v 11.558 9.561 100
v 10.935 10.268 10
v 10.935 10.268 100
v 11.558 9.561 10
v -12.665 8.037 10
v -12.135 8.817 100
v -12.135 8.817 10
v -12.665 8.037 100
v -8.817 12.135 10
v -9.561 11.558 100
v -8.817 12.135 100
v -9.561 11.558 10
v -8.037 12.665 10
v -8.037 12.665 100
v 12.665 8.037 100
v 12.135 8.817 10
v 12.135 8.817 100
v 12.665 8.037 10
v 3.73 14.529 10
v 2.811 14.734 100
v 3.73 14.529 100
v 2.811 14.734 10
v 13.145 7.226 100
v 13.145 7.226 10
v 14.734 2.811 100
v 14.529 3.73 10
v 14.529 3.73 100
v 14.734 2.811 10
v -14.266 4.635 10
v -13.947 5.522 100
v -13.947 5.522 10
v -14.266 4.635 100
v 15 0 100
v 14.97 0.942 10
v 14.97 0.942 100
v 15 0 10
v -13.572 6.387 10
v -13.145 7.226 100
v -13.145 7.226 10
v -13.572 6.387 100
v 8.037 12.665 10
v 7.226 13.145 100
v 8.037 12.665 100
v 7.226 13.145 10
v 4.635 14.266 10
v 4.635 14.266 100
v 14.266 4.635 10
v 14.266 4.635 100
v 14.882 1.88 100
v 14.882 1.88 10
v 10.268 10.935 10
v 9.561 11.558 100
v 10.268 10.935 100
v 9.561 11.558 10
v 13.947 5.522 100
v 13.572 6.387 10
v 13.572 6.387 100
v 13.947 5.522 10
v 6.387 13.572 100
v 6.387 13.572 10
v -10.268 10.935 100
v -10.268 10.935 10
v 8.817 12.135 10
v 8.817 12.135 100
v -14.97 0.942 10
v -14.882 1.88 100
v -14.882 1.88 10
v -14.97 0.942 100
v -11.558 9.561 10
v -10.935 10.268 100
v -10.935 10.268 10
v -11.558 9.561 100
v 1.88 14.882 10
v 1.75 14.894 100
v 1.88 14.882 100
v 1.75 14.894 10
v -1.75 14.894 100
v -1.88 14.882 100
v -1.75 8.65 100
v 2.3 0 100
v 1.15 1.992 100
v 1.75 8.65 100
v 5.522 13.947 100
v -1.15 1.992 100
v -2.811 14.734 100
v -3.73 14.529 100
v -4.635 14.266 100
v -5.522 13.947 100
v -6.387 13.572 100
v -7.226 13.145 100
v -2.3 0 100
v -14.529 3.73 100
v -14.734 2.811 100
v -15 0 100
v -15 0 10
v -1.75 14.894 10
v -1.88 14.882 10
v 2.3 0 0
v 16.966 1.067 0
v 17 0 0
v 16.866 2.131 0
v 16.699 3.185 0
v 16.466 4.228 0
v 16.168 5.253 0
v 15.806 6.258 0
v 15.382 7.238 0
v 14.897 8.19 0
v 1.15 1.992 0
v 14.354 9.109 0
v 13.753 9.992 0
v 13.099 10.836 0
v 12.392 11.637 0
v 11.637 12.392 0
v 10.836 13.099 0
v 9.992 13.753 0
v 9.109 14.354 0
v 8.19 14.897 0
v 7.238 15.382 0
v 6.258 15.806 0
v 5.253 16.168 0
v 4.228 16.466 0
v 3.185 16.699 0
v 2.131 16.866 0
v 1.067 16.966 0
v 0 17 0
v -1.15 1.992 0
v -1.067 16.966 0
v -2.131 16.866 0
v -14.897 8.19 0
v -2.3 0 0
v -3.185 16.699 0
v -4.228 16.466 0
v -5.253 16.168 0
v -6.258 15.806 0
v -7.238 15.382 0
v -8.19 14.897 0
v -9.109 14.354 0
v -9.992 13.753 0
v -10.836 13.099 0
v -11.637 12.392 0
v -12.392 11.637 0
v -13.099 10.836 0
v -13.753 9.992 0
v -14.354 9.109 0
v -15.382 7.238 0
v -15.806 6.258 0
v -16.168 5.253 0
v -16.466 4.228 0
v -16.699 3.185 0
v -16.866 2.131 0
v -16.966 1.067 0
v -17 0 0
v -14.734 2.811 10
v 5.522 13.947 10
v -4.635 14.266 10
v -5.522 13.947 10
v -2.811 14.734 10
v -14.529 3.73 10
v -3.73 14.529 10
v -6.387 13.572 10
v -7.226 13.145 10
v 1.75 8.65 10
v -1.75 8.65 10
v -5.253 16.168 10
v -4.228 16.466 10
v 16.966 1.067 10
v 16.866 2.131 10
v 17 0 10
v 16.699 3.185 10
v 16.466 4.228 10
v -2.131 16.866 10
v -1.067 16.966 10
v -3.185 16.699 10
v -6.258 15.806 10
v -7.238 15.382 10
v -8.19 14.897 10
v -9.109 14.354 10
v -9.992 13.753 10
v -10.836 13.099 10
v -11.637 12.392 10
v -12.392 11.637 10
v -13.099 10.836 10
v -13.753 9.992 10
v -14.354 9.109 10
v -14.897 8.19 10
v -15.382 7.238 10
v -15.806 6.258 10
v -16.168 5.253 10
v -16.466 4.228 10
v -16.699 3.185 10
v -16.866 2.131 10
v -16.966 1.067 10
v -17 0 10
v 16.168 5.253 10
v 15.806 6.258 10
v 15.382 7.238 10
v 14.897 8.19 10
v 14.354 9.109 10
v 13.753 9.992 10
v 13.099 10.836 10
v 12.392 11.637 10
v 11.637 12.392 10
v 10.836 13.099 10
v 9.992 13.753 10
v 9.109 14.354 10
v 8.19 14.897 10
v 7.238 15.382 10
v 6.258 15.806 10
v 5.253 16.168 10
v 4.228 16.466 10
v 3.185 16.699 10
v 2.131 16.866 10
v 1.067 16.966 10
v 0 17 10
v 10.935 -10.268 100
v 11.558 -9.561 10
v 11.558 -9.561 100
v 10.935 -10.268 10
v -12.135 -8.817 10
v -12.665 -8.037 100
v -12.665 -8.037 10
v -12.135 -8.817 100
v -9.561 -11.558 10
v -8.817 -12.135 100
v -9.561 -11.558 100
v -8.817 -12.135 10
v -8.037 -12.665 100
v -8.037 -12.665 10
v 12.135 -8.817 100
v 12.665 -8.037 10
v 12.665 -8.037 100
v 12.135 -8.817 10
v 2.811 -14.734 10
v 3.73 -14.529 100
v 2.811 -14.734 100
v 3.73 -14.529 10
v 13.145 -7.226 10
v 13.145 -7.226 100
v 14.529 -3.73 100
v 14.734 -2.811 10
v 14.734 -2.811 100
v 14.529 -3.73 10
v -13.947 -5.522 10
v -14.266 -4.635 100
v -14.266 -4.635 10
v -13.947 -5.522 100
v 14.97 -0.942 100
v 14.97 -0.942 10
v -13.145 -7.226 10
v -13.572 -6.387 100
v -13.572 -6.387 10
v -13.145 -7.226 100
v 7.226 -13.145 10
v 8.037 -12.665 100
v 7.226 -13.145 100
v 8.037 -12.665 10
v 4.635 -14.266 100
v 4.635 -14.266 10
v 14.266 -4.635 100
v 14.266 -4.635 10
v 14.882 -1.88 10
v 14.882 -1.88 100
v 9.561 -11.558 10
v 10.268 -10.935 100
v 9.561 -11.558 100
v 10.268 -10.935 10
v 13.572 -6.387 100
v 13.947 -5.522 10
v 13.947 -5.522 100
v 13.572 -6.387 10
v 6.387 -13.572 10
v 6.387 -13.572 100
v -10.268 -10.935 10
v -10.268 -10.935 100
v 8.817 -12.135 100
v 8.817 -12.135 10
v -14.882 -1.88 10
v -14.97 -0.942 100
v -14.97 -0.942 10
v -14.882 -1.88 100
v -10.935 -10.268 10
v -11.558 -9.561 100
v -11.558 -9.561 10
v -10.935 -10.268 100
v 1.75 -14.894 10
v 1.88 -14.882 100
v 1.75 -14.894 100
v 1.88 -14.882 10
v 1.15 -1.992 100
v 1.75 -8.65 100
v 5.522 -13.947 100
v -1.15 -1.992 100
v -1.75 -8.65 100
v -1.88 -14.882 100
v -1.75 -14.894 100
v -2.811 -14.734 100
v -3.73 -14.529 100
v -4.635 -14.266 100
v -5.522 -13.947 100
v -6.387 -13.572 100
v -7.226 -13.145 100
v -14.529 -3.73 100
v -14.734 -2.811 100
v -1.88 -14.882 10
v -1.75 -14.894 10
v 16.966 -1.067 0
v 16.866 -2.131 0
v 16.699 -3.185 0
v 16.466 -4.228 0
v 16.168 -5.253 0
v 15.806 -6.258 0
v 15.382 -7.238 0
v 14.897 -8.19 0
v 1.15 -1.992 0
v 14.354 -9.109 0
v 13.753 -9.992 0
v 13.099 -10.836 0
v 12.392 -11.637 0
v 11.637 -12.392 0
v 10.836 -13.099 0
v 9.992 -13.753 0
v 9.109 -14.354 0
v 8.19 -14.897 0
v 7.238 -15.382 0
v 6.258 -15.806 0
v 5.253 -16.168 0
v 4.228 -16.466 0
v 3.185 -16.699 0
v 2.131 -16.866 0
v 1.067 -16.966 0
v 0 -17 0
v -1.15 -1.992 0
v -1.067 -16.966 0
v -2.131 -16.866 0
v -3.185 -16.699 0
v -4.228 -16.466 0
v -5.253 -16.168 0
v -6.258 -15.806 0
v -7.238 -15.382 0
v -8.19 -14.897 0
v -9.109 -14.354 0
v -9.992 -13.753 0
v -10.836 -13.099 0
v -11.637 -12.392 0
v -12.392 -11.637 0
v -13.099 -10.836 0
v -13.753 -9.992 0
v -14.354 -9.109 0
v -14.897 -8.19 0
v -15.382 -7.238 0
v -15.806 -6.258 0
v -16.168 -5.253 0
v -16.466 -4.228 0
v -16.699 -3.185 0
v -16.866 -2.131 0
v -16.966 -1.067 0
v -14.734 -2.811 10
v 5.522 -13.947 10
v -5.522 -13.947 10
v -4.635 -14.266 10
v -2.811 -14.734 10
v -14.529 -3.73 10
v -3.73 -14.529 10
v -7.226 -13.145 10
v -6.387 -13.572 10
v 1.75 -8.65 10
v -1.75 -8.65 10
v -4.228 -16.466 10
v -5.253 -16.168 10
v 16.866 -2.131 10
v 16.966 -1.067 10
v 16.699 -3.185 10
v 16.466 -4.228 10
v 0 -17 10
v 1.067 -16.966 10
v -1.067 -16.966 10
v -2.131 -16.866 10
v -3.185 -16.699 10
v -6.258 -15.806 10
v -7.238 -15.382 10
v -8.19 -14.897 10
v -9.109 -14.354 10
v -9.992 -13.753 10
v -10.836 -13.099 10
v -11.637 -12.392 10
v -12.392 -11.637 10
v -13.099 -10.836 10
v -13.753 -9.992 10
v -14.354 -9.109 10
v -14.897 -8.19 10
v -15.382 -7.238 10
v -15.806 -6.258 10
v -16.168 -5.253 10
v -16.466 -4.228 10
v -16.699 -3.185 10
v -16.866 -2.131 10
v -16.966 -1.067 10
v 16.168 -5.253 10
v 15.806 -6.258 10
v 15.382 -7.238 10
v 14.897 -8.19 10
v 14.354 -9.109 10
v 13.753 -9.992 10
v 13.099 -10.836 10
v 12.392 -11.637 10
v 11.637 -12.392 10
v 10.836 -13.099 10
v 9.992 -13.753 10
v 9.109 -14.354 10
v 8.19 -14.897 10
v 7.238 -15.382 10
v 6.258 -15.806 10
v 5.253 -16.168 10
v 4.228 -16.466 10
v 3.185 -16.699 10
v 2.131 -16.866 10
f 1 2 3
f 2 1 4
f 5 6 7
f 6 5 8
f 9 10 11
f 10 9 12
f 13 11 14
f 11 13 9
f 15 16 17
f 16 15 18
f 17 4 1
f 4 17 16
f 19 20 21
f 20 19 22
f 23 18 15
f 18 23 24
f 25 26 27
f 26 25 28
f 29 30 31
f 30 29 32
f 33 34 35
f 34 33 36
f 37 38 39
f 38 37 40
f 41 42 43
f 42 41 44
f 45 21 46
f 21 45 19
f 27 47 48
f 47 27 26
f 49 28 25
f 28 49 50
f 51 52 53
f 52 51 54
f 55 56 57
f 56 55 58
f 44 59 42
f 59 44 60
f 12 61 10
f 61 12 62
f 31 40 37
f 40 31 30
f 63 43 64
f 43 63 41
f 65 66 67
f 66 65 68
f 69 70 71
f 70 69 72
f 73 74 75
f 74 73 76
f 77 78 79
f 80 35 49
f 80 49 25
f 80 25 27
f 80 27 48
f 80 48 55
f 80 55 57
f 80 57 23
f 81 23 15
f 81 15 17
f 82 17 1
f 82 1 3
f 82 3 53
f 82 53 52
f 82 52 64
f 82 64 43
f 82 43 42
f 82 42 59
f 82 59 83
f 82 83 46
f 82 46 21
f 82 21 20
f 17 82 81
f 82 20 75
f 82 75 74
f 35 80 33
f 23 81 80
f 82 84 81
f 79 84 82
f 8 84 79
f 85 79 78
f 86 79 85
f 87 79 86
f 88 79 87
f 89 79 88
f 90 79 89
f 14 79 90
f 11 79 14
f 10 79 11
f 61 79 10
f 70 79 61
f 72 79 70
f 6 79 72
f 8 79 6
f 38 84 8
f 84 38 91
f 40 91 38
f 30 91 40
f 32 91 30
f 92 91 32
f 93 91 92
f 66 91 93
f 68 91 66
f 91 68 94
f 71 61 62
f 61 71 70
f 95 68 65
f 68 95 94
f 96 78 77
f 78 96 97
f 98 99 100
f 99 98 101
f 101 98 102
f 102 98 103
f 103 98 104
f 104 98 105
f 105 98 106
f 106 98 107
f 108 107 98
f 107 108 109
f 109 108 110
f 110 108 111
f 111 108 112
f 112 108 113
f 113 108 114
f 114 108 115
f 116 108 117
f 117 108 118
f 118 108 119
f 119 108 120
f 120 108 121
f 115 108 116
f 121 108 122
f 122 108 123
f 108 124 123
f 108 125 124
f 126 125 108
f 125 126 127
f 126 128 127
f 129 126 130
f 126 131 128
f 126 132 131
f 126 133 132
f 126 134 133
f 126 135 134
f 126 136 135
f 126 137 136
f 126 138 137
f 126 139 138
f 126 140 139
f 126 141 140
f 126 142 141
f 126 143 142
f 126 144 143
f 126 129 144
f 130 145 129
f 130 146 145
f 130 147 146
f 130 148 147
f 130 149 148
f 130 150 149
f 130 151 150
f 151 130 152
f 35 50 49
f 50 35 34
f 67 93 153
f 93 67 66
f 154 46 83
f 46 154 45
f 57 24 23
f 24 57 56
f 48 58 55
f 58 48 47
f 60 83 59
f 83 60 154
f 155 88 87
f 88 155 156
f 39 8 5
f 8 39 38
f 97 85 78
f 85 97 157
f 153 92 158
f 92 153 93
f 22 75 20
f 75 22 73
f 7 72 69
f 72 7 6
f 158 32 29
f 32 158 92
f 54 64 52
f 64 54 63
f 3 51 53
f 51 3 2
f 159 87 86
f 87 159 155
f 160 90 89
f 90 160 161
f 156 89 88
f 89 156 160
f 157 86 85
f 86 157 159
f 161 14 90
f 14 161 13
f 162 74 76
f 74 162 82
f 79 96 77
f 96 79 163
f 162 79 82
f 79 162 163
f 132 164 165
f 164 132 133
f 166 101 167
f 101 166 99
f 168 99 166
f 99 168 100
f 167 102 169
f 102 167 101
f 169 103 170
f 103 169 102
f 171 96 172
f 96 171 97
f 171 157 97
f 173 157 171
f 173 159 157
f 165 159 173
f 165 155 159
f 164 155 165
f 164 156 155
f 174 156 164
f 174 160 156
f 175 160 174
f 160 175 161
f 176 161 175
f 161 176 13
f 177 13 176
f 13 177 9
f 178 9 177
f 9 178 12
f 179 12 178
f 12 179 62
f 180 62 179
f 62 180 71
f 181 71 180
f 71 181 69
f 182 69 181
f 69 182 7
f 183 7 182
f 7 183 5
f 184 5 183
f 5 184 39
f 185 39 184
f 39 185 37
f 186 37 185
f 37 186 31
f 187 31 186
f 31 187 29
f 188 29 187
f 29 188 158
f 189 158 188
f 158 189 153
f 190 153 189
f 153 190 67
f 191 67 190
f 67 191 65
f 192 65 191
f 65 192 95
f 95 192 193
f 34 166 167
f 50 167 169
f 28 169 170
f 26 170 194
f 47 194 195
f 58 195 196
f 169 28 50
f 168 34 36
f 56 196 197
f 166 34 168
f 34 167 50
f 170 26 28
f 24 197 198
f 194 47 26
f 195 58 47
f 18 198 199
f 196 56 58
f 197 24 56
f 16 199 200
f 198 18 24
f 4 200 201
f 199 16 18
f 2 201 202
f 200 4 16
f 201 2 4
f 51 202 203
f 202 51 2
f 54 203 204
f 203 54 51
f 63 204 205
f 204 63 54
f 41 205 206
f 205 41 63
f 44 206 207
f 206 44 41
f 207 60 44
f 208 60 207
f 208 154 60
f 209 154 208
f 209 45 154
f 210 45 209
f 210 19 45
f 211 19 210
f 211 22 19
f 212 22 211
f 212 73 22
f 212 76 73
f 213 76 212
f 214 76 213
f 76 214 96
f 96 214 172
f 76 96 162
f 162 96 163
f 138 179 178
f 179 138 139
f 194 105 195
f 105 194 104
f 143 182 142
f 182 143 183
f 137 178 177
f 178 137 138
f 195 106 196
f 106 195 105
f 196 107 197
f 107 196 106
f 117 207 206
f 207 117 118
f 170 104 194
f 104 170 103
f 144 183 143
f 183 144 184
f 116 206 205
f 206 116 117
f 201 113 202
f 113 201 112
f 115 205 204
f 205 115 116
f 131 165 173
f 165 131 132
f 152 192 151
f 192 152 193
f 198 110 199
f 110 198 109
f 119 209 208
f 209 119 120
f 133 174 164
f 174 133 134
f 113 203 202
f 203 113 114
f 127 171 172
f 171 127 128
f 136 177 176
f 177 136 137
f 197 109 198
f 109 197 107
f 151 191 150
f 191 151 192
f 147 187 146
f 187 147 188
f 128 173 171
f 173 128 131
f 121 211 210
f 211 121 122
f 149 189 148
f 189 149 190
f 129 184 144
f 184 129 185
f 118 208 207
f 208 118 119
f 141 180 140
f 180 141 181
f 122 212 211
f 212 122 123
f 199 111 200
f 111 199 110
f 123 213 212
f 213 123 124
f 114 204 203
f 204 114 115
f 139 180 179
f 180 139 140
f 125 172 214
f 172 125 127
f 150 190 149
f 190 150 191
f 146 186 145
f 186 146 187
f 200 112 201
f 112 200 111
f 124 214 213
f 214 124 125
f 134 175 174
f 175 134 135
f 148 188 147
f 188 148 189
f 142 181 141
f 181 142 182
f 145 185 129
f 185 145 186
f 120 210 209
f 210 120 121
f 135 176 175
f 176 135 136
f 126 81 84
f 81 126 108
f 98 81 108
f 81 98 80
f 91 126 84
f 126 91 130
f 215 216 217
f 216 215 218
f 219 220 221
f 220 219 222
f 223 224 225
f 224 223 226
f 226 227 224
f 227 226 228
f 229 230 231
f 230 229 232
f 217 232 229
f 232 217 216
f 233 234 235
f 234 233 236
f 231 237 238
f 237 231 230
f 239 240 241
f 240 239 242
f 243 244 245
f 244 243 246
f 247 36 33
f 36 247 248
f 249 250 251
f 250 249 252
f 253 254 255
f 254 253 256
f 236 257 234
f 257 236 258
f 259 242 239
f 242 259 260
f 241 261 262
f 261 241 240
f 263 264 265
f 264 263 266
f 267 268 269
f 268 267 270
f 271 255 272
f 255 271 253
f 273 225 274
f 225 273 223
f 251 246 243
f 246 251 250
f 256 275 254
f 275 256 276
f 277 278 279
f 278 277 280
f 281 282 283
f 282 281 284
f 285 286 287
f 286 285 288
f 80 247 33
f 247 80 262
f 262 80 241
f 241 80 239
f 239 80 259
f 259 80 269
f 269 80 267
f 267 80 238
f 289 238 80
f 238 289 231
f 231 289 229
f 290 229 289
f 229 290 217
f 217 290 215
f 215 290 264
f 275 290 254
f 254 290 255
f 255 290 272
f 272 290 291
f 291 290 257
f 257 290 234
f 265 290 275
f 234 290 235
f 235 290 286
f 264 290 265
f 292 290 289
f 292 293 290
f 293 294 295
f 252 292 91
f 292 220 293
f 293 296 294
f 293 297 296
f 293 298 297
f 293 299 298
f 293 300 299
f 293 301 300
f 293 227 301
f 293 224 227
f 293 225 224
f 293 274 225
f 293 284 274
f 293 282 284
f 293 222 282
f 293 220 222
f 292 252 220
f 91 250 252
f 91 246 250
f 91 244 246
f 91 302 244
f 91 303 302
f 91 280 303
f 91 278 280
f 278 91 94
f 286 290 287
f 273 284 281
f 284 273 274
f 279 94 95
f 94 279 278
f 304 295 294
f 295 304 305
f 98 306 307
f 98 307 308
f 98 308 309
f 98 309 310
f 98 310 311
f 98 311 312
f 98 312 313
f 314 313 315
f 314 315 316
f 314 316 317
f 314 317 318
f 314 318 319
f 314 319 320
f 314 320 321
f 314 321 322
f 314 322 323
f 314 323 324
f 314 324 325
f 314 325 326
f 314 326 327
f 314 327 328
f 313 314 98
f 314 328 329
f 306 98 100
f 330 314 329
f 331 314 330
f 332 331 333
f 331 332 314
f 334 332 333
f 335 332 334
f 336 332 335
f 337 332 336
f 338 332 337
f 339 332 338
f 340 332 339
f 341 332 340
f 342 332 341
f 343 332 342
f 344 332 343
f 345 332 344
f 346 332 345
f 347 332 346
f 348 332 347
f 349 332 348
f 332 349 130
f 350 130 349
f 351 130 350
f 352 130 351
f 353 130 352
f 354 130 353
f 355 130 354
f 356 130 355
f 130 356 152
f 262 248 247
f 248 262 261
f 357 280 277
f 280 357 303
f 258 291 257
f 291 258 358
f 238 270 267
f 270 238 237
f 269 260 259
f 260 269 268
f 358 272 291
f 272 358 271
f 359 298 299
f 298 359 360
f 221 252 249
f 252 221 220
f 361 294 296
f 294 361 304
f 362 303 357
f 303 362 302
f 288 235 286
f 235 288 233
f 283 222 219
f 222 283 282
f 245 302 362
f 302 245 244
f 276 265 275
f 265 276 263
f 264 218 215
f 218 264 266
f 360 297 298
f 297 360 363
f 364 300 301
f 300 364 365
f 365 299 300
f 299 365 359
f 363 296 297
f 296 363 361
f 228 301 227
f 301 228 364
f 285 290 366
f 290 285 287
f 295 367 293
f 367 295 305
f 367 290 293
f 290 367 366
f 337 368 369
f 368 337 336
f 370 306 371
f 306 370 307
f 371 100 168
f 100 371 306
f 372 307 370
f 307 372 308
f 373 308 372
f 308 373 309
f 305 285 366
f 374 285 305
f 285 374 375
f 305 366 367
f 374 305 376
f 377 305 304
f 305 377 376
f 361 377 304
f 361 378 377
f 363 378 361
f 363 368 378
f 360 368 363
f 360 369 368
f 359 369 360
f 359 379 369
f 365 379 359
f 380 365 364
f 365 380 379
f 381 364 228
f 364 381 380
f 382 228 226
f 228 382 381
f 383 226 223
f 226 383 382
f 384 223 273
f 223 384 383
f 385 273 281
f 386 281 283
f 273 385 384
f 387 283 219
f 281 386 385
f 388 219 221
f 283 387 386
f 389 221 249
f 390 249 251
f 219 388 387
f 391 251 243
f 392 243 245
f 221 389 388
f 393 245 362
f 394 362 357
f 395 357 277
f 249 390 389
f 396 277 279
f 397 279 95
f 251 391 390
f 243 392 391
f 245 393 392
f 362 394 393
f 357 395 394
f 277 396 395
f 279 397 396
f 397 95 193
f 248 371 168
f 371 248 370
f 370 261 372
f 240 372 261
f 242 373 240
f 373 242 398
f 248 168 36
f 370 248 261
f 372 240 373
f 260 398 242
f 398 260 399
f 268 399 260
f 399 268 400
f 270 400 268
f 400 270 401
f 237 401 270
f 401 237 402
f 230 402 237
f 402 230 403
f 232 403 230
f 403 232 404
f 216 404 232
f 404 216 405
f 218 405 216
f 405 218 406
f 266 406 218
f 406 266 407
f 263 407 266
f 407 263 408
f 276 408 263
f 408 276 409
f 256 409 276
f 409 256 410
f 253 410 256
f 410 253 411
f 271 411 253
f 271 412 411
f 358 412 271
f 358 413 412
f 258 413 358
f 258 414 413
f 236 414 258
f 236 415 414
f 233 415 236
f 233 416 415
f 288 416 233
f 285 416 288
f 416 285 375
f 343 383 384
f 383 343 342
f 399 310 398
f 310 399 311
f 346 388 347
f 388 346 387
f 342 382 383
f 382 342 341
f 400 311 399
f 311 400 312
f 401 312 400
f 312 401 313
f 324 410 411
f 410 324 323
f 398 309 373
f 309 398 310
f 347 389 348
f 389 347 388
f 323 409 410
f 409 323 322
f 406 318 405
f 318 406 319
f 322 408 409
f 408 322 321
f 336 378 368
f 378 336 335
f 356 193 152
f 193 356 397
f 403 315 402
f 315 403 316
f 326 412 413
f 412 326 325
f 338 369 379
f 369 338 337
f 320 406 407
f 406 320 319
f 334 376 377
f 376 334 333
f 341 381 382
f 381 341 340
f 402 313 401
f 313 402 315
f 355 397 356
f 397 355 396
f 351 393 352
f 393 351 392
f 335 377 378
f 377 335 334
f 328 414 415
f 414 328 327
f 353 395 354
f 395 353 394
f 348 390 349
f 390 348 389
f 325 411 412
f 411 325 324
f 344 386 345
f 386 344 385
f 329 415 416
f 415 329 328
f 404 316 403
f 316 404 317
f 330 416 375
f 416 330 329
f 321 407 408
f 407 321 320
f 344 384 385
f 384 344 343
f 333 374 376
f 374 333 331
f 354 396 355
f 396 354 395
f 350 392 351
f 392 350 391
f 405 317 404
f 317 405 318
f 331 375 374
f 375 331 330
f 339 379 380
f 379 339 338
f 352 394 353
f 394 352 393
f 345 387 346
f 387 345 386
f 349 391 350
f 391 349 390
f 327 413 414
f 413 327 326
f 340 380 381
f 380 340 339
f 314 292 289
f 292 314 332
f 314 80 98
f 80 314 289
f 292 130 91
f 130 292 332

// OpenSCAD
epsilon = 0.001;
$fn = 100;

module halfCylinder(height, r) {
    mirror([0, 1, 0])
    difference() {
        cylinder(height, r, r, $fn=$fn);
        translate([-r, 0, -epsilon])
            cube(size=[r*2+epsilon, r*2+2*epsilon, height+epsilon*2]);
    }
}

module halfShaft(height, outerR, centerR, wireR, centerFn=6) {
    difference(){
        union() {
            difference() {
                halfCylinder(height, outerR);
                translate([-wireR/2, (outerR + centerR)/2, -epsilon]) 
                    cube([wireR, height, (height+epsilon)*2]);
            }
            difference() {
                marginR = 2;
                r = outerR+marginR;
                translate([0, 0, 5])
                    cylinder(10, r, r, center=true);
                mirror ([0, 1, 0])
                    translate([-r, 0, -epsilon])
                        cube(size=[r*2+epsilon, r*2+2*epsilon, height+epsilon*2]);
            }
        }
        cylinder((height+epsilon)*2, centerR, centerR, center=true, $fn=centerFn);
    }
}

color("red") 
    union() {
        halfShaft(height=100, outerR=15, centerR=2.3, wireR=3.5);
        mirror([0, 1, 0])
            halfShaft(height=100, outerR=15, centerR=2.3, wireR=3.5);
    }
